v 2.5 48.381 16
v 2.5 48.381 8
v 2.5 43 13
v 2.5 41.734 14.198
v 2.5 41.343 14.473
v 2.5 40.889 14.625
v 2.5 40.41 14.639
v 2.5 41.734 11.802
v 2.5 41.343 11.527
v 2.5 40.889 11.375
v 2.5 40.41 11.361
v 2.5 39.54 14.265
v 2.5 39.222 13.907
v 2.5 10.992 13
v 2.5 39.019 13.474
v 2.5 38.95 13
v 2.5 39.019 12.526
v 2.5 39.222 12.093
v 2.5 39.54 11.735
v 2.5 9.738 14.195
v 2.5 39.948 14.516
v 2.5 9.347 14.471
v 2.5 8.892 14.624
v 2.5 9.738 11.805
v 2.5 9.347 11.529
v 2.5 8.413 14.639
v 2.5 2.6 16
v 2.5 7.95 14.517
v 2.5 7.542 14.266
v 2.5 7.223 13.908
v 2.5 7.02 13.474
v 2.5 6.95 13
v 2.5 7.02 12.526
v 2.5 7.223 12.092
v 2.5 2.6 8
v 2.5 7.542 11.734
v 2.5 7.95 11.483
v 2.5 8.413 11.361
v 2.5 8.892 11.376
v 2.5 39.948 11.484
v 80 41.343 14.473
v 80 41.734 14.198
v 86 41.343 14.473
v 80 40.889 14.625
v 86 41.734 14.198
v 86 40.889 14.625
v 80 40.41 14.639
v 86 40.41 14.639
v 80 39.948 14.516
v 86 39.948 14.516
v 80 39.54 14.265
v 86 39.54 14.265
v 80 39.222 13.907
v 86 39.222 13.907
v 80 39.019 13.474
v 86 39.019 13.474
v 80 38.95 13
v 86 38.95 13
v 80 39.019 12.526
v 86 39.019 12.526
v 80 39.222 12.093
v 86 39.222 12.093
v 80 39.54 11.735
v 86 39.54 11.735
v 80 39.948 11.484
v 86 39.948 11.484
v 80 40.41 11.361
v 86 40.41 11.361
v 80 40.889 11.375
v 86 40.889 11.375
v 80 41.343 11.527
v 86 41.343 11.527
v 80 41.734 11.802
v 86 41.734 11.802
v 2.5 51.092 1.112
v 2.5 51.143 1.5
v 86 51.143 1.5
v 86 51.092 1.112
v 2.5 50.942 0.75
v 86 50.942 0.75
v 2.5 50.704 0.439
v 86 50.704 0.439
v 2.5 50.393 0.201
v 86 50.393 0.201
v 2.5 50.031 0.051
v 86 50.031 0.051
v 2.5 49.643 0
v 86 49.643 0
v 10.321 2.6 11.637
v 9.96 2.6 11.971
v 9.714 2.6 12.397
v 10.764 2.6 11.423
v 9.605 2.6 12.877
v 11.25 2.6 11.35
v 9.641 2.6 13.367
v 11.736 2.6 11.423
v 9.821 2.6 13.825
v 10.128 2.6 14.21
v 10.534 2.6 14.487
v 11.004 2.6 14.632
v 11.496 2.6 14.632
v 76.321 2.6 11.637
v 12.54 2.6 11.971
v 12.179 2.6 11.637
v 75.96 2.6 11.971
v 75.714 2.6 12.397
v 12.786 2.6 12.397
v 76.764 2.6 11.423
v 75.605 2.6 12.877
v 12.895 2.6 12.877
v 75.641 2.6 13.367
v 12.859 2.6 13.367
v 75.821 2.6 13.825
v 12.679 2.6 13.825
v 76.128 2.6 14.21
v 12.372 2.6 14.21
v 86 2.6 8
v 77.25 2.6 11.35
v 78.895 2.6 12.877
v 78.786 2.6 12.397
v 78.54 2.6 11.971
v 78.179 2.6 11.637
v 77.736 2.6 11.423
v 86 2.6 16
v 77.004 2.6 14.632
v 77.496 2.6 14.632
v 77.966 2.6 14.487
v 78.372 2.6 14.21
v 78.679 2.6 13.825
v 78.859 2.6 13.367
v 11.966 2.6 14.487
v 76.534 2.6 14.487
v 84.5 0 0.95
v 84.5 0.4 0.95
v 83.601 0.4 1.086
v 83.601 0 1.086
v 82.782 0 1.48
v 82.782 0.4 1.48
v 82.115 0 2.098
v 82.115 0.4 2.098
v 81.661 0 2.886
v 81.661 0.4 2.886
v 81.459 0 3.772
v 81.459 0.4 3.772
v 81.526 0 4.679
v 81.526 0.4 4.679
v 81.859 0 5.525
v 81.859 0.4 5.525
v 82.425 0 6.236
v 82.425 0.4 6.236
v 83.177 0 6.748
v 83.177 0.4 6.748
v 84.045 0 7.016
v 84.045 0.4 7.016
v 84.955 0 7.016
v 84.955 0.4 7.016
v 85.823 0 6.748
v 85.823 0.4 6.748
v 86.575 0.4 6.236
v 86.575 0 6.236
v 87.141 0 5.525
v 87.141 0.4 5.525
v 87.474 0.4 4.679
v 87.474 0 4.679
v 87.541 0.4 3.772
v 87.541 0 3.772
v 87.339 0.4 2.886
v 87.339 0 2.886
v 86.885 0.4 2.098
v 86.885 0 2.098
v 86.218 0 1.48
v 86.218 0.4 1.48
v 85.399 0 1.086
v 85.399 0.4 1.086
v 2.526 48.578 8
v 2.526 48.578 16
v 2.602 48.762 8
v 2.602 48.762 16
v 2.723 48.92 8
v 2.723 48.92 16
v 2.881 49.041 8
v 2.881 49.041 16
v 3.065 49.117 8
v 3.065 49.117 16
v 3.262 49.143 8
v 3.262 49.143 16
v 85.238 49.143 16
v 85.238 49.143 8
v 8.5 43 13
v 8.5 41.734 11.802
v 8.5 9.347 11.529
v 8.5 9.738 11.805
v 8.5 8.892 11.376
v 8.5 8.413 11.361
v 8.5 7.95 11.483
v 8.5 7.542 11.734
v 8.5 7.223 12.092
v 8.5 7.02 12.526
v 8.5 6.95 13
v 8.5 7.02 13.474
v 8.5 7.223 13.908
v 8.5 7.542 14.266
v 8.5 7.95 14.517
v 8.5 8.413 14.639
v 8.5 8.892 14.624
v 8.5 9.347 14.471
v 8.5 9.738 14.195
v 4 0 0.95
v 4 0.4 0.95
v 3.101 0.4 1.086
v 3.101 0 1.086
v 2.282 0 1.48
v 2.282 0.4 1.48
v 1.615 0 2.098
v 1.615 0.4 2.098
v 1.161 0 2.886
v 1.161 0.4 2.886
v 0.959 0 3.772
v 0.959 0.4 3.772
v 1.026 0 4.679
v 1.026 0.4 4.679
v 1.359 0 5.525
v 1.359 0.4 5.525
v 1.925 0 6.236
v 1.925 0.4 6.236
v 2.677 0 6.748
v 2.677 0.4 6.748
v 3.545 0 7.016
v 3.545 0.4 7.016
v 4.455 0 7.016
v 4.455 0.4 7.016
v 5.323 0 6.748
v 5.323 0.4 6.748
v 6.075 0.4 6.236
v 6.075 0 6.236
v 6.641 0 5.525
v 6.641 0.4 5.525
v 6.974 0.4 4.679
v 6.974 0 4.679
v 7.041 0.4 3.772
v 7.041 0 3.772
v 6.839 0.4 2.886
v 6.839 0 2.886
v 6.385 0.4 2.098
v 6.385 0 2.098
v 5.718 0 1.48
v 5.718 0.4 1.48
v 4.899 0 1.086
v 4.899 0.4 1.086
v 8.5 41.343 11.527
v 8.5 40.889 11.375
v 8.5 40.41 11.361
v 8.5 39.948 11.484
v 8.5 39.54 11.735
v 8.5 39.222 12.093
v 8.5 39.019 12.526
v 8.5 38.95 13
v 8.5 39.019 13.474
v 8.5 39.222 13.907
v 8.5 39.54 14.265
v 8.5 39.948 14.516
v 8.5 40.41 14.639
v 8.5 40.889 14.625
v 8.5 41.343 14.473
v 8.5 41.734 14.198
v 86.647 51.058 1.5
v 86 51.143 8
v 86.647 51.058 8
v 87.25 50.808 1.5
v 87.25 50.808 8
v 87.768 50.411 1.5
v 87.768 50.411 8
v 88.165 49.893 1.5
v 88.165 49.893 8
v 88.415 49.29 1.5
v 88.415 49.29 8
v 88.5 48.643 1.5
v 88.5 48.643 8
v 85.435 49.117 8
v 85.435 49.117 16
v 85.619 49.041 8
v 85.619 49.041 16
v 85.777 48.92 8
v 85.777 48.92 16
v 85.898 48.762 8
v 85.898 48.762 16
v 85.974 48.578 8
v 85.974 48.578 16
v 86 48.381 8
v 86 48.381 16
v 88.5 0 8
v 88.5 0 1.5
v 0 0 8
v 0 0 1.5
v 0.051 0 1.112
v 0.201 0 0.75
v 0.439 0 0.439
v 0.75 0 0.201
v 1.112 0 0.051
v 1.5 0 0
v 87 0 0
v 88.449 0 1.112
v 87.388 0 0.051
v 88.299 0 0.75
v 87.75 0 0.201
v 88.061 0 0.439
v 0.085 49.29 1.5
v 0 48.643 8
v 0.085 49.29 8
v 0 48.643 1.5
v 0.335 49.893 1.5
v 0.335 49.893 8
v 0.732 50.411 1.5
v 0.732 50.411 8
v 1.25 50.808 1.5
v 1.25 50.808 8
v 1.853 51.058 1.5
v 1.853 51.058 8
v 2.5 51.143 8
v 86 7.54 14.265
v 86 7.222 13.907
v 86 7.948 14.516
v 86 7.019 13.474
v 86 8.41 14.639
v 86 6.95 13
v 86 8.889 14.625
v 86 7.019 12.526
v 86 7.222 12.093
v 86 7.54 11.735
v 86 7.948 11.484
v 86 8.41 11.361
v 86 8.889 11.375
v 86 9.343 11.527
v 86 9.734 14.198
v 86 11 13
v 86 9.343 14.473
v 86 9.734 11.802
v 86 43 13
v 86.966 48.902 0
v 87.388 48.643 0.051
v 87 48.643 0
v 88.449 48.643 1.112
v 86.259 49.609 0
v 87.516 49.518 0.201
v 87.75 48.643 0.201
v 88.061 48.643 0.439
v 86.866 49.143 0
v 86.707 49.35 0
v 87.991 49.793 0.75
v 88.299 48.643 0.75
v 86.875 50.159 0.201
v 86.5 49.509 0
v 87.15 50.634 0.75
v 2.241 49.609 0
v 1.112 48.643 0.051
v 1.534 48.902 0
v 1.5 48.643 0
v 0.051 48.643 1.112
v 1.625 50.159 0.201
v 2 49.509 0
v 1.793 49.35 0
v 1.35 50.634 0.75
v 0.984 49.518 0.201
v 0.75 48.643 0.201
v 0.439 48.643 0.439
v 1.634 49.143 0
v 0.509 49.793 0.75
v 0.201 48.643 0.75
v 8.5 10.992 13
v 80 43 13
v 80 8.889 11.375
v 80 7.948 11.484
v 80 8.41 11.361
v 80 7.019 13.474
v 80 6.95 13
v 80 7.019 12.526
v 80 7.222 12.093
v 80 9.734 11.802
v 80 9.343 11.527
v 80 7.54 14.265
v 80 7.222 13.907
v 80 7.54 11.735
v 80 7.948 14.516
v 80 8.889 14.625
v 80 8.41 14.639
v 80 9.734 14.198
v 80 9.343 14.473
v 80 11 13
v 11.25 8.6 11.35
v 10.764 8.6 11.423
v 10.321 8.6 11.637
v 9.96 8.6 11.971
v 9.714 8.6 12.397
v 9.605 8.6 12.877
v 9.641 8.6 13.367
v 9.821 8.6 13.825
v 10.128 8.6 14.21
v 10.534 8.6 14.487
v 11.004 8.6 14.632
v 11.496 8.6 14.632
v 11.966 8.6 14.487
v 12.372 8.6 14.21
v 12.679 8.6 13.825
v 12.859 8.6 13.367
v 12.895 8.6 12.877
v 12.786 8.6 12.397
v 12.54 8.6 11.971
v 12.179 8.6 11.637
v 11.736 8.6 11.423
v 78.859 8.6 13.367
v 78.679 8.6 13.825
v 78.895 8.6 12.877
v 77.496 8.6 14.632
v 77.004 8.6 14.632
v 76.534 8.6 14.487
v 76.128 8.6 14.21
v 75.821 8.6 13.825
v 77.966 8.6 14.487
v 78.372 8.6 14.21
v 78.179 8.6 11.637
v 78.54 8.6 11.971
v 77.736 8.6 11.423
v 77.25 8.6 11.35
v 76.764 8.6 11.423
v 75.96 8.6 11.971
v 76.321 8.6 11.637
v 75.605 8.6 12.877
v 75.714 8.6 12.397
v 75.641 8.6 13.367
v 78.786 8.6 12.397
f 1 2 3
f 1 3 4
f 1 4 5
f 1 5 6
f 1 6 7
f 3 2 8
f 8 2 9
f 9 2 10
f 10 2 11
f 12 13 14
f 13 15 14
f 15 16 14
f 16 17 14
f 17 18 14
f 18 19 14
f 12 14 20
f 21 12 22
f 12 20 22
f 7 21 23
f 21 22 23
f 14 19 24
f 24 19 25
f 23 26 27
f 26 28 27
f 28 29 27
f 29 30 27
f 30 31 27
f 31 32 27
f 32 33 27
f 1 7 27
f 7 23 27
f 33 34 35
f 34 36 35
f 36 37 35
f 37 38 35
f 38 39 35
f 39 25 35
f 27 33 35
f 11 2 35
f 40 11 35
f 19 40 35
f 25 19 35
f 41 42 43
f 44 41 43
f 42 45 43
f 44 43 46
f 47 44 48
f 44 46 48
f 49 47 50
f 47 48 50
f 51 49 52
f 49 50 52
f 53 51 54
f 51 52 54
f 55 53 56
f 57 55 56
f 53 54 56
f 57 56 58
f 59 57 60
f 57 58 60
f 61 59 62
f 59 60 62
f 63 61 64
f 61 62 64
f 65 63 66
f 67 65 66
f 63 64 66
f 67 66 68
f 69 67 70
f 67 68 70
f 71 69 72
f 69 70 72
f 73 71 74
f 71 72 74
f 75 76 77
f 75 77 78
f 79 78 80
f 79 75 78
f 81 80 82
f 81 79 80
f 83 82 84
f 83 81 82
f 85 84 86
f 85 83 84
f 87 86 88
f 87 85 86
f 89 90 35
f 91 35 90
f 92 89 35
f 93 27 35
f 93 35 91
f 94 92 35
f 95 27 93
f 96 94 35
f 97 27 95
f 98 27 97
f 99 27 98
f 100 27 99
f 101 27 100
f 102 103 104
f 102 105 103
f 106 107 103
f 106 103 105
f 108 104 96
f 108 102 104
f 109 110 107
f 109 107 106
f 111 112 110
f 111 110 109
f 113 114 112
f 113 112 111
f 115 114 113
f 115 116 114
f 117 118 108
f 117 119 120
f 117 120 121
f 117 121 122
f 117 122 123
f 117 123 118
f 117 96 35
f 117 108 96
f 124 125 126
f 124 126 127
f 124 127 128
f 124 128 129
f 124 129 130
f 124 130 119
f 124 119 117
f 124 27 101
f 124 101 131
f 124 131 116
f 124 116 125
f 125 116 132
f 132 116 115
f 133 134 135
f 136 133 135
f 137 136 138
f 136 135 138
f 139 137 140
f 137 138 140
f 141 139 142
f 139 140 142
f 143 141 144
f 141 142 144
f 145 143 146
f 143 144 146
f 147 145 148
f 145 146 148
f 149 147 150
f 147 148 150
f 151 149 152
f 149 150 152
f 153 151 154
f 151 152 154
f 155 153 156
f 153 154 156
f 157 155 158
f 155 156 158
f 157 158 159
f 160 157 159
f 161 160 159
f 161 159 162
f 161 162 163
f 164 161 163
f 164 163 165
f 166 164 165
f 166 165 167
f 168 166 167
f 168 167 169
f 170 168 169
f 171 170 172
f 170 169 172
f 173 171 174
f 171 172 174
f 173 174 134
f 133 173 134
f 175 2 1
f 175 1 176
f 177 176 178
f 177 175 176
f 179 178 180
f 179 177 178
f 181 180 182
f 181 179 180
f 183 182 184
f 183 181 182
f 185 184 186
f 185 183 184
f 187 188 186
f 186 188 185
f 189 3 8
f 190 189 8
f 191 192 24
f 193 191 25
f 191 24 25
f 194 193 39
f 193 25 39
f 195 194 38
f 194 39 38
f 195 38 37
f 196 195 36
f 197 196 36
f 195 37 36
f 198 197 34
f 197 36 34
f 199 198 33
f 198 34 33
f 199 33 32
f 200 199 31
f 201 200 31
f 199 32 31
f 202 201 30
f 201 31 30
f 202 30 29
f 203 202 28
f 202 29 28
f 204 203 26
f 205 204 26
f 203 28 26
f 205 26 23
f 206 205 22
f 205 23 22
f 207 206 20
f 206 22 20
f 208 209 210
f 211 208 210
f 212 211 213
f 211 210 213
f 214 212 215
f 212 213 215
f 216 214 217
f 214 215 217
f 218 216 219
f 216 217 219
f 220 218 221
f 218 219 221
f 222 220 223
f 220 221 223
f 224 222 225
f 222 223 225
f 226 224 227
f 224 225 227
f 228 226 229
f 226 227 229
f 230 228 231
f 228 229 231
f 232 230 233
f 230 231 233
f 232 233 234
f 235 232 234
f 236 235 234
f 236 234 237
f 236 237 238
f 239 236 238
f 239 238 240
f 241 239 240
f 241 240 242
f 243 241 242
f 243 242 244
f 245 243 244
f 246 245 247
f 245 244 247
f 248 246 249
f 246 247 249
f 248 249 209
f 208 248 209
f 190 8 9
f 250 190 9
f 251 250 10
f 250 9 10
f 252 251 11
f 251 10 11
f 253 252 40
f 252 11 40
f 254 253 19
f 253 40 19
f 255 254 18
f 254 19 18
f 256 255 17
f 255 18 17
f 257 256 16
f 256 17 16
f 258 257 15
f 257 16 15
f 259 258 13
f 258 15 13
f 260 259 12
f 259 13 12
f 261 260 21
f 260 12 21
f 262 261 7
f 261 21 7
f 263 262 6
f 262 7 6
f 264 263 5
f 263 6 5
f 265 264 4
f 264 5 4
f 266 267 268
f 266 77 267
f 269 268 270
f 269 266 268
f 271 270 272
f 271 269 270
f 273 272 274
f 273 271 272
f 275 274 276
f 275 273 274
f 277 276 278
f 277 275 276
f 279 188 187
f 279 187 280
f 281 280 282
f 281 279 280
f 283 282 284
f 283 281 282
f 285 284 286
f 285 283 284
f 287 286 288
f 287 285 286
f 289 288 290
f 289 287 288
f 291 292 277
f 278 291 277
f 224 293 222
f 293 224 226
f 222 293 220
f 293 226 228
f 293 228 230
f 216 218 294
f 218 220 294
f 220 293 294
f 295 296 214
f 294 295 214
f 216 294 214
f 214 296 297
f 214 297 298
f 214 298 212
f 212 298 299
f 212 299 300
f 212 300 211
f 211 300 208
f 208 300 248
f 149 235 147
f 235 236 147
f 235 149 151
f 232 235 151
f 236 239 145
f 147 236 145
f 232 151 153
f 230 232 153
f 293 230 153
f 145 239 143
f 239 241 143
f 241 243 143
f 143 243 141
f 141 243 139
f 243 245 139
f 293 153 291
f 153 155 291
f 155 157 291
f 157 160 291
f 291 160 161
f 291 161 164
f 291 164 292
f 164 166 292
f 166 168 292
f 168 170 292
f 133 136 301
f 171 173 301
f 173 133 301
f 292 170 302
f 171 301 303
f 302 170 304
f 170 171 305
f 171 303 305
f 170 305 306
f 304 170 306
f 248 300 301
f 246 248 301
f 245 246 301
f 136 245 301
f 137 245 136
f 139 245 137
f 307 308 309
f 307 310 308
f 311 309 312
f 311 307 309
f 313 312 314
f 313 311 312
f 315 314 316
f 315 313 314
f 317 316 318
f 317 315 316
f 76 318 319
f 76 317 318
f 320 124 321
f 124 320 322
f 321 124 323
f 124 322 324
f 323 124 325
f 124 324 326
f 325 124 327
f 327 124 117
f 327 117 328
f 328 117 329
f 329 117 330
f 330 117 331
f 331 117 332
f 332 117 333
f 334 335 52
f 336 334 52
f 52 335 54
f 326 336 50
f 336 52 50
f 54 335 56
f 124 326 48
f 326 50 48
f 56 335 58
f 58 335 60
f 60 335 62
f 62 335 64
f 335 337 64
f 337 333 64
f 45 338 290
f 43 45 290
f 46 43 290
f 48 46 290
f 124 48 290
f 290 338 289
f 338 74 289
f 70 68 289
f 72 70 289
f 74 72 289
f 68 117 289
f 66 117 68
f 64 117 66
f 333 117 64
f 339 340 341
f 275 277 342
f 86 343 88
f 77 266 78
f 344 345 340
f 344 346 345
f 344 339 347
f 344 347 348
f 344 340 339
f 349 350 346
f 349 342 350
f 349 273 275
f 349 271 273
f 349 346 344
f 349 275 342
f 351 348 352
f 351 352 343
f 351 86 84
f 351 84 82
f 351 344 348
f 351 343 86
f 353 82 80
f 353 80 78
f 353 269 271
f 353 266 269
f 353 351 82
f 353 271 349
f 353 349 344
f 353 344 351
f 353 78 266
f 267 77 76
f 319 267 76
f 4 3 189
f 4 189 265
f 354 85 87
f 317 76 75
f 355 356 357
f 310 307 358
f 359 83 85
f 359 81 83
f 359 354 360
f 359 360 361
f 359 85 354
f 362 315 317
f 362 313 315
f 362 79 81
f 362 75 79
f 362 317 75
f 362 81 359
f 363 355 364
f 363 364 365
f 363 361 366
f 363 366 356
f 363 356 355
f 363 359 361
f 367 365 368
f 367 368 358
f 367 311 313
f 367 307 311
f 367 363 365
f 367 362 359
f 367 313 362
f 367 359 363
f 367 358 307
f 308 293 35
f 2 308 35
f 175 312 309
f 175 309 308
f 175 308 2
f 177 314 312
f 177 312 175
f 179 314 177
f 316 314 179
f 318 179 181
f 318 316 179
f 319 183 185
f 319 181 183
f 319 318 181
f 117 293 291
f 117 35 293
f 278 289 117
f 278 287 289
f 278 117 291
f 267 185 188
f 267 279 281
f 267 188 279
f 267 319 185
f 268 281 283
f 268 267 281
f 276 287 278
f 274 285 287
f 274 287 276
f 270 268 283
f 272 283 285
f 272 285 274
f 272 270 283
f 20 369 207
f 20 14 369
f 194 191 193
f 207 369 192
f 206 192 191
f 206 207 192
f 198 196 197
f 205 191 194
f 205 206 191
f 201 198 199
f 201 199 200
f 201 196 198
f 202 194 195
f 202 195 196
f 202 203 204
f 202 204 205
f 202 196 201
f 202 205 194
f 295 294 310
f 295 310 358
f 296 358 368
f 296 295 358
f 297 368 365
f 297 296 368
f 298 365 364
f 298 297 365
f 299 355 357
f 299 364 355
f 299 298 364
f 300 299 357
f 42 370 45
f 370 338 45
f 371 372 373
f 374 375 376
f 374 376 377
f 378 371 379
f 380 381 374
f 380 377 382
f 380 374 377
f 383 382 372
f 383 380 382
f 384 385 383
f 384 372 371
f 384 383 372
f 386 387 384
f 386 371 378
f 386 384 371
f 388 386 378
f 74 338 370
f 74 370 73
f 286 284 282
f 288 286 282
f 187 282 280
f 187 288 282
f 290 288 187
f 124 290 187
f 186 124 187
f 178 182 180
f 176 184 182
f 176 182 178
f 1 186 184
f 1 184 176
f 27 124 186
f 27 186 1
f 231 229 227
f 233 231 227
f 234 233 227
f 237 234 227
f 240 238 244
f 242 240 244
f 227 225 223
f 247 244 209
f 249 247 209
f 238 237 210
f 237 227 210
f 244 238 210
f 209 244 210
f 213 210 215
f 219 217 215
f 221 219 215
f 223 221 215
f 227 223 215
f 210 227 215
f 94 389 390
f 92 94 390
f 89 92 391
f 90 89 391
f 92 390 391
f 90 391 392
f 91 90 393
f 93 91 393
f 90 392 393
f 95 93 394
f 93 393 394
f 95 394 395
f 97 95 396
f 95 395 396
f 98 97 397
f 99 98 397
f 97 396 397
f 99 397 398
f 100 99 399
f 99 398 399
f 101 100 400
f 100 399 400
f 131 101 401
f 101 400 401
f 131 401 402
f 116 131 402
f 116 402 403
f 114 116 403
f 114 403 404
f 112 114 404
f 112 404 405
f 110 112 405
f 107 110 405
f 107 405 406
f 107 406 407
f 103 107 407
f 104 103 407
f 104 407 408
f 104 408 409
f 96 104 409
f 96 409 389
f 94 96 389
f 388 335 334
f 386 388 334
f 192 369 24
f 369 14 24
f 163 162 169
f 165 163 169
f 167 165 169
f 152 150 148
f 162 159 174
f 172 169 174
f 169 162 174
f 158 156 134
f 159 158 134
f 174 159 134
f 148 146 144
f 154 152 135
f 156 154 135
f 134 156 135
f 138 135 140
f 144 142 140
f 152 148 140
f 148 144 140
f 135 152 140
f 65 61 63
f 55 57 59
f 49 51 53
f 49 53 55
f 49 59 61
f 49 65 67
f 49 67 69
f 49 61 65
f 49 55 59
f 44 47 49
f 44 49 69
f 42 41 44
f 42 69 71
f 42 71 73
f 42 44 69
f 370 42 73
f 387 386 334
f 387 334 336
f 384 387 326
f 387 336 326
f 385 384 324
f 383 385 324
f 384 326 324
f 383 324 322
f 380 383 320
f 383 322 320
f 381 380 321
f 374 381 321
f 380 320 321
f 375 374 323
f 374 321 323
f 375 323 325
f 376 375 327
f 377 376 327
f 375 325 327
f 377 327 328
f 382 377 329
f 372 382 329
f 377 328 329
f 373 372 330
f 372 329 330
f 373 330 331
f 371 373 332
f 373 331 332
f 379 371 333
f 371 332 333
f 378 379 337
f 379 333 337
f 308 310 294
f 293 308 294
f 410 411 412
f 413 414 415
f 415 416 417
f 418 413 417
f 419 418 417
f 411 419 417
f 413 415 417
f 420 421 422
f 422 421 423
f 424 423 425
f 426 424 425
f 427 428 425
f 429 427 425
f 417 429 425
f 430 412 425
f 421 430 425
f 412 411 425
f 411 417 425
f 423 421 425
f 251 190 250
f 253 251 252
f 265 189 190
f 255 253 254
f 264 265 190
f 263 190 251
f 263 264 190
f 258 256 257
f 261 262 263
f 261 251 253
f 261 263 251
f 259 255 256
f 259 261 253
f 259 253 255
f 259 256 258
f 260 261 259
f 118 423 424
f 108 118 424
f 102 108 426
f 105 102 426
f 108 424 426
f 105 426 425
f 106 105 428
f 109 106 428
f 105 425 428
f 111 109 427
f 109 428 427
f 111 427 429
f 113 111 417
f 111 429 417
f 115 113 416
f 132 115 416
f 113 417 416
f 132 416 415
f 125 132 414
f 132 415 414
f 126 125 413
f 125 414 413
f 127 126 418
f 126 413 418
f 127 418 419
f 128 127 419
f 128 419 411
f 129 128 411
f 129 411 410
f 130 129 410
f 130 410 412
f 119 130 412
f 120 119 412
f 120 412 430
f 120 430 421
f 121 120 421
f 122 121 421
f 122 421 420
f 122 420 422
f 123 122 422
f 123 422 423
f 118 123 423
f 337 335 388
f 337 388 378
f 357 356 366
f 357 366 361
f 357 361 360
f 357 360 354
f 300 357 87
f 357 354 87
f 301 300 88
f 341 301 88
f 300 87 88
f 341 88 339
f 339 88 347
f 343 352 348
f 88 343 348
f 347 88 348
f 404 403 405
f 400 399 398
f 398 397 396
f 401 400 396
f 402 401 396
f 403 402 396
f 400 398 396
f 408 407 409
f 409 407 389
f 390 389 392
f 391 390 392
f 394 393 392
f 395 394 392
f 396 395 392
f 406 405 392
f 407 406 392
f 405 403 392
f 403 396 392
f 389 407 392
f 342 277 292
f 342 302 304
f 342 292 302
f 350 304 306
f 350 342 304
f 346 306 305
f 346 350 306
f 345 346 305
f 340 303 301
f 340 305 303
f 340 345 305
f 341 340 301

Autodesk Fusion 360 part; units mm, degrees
sketch "base" plane through (0, 0, 0) normal (0, 0, 1) x (1, 0, 0)
  line L0 (0, 0) -> (88.5, 0)
  line L1 (88.5, 0) -> (88.5, 48.643)
  line L2 (86, 51.143) -> (2.5, 51.143)
  line L3 (0, 48.643) -> (0, 0)
  arc A0 (2.5, 51.143) -> (0, 48.643) centre (2.5, 48.643) ccw
  arc A1 (88.5, 48.643) -> (86, 51.143) centre (86, 48.643) ccw
  point P0 (0, 51.143)
  dimension "d1" = 88.5
  dimension "d2" = 51.143
  dimension "d14" = 2.5
  dimension "d15" = 2.5
extrude "Extrude1" add sketch "base" along normal blind 8
sketch "inside part" plane through (0, 0, 8) normal (0, 0, 1) x (-1, 0, 0)
  line L0 (0, -48.643) -> (0, 0)
  line L1 (0, 0) -> (-88.5, 0)
  line L2 (-88.5, 0) -> (-88.5, -48.643)
  line L3 (-86, -51.143) -> (-2.5, -51.143)
  line L4 (-2.5, 0) -> (-86, 0)
  line L5 (-86, 0) -> (-86, -48.381)
  line L6 (-85.238, -49.143) -> (-3.262, -49.143)
  line L7 (-2.5, -48.381) -> (-2.5, 0)
  arc A0 (-3.262, -49.143) -> (-2.5, -48.381) centre (-3.262, -48.381) ccw
  arc A1 (-86, -48.381) -> (-85.238, -49.143) centre (-85.238, -48.381) ccw
  arc A2 (-88.5, -48.643) -> (-86, -51.143) centre (-86, -48.643) ccw
  arc A3 (-2.5, -51.143) -> (0, -48.643) centre (-2.5, -48.643) ccw
  dimension "d7" = 2.5
  dimension "d8" = 2.5
  dimension "d9" = 2
  dimension "d12" = 0.762
  dimension "d13" = 0.762
extrude "Extrude2" add sketch "inside part" along normal blind 8 contours L1 L4 L5 L6 L7 A0 A1
fillet "Fillet1" radius 1.5 5 edges at (88.5, 24.3215, 0) (87.7678, 50.4108, 0) (44.25, 51.143, 0) (0.7322, 50.4108, 0) (0, 24.3215, 0)
sketch "Sketch3" plane through (0, 0, 0) normal (0, -1, 0) x (1, 0, 0)
  arc A0 (87, 0) -> (88.5, 1.5) centre (87, 1.5) ccw
  line L0 (88.5, 1.5) -> (88.5, 8)
  line L1 (88.5, 8) -> (86, 8)
  line L2 (86, 8) -> (86, 16)
  line L3 (86, 16) -> (2.5, 16)
  line L4 (2.5, 16) -> (2.5, 8)
  line L5 (2.5, 8) -> (0, 8)
  line L6 (0, 8) -> (0, 1.5)
  arc A1 (0, 1.5) -> (1.5, 0) centre (1.5, 1.5) ccw
  line L7 (1.5, 0) -> (87, 0)
  line L8 (86, 8) -> (2.5, 8)
  line L9 (2.5, 8) -> (2.5, 16)
  line L10 (2.5, 16) -> (86, 16)
  line L11 (86, 16) -> (86, 8)
extrude "Extrude3" cut sketch "Sketch3" against normal blind 2.6 contours L2 L3 L4 L8 L9 L10 L11
sketch "Bottom holes for M2.5 screws" plane through (0, 2.6, 0) normal (0, -1, 0) x (1, 0, 0)
  line L0 (86, 16) -> (2.5, 16)
  line L1 (2.5, 16) -> (2.5, 8)
  line L2 (2.5, 8) -> (86, 8)
  line L3 (86, 8) -> (86, 16)
  line L4 (44.25, 8) -> (44.25, 16) construction
  point P0 (77.25, 13)
  point P1 (11.25, 13)
  dimension "d21" = 33
  dimension "d22" = 33
  dimension "d44" = 5
hole "Hole1" at (11.25, 2.6, 13) at (77.25, 2.6, 13) direction (0, 1, 0) diameter 3.3 depth 6 tip angle 180
sketch "Front/back holes" plane through (86, 0, 0) normal (1, 0, 0) x (0, 1, 0)
  line L0 (2.6, 16) -> (2.6, 8)
  line L1 (2.6, 8) -> (48.381, 8)
  line L2 (48.381, 8) -> (48.381, 16)
  line L3 (48.381, 16) -> (2.6, 16)
  circle A0 centre (8.6, 13) radius 1.65
  circle A1 centre (40.6, 13) radius 1.65
  line L4 (11, 13) -> (9.7344, 14.1982)
  line L5 (11, 13) -> (9.7344, 11.8018)
  line L6 (43, 13) -> (41.7344, 14.1982)
  line L7 (43, 13) -> (41.7344, 11.8018)
  point P0 (8.6, 13)
  point P1 (40.6, 13)
  dimension "d27" = 6
  dimension "d28" = 32
  dimension "d29" = 5
  dimension "d50" = 3.3
  dimension "d51" = 3.3
  dimension "d54" = 2.4
  dimension "d55" = 2.4
extrude "Extrude5" cut sketch "Front/back holes" against normal blind 6 contours A0 | A0 L4 L5 | A1 | A1 L6 L7
sketch "Front/back holes (1)" plane through (2.5, 0, 0) normal (-1, 0, 0) x (0, -1, 0)
  line L0 (-2.6, 8) -> (-2.6, 16)
  line L1 (-2.6, 16) -> (-48.381, 16)
  line L2 (-48.381, 16) -> (-48.381, 8)
  line L3 (-48.381, 8) -> (-2.6, 8)
  circle A0 centre (-40.6, 13) radius 1.65
  circle A1 centre (-8.6, 13) radius 1.65
  line L4 (-43, 13) -> (-41.7344, 11.8018)
  line L5 (-43, 13) -> (-41.7344, 14.1982)
  line L6 (-10.9921, 13) -> (-9.7381, 14.1947)
  line L7 (-10.9921, 13) -> (-9.7381, 11.8053)
  point P0 (-40.6, 13)
  point P1 (-8.6, 13)
  point P2 (-40.6, 13)
  point P3 (-40.6, 13)
  point P4 (-43, 13)
  point P5 (-8.6, 13)
  point P6 (-8.6, 13)
  point P7 (-11, 13)
  dimension "d33" = 6
  dimension "d34" = 32
  dimension "d45" = 5
  dimension "d46" = 3.3
  dimension "d47" = 3.3
  dimension "d56" = 2.4
  dimension "d57" = 2.4
extrude "Extrude4" cut sketch "Front/back holes (1)" against normal blind 6 contours A0 | A0 L4 L5 | A1 | A1 L6 L7
sketch "Sketch8" plane through (0, 0, 0) normal (0, -1, 0) x (1, 0, 0)
  line L0 (88.5, 8) -> (0, 8)
  line L1 (0, 8) -> (0, 1.5)
  arc A0 (0, 1.5) -> (1.5, 0) centre (1.5, 1.5) ccw
  line L2 (1.5, 0) -> (87, 0)
  arc A1 (87, 0) -> (88.5, 1.5) centre (87, 1.5) ccw
  line L3 (88.5, 1.5) -> (88.5, 8)
  line L4 (88.5, 4) -> (0, 4) construction
  point P0 (4, 4)
  point P1 (84.5, 4)
  dimension "d58" = 4
  dimension "d59" = 4
  dimension "d60" = 4
  dimension "d61" = 4
hole "Hole4" at (4, 0, 4) at (84.5, 0, 4) direction (0, 1, 0) diameter 6.1 depth 0.4 tip angle 180
equation "d1 = 83.5 mm + 2 * extrawidth"
equation "d2 = extraheight + 49.143 mm"
equation "extrawidth = 2.5 mm"
equation "extraheight = 2 mm"
equation "d7 = extrawidth"
equation "d8 = extrawidth"
equation "d9 = extraheight"
